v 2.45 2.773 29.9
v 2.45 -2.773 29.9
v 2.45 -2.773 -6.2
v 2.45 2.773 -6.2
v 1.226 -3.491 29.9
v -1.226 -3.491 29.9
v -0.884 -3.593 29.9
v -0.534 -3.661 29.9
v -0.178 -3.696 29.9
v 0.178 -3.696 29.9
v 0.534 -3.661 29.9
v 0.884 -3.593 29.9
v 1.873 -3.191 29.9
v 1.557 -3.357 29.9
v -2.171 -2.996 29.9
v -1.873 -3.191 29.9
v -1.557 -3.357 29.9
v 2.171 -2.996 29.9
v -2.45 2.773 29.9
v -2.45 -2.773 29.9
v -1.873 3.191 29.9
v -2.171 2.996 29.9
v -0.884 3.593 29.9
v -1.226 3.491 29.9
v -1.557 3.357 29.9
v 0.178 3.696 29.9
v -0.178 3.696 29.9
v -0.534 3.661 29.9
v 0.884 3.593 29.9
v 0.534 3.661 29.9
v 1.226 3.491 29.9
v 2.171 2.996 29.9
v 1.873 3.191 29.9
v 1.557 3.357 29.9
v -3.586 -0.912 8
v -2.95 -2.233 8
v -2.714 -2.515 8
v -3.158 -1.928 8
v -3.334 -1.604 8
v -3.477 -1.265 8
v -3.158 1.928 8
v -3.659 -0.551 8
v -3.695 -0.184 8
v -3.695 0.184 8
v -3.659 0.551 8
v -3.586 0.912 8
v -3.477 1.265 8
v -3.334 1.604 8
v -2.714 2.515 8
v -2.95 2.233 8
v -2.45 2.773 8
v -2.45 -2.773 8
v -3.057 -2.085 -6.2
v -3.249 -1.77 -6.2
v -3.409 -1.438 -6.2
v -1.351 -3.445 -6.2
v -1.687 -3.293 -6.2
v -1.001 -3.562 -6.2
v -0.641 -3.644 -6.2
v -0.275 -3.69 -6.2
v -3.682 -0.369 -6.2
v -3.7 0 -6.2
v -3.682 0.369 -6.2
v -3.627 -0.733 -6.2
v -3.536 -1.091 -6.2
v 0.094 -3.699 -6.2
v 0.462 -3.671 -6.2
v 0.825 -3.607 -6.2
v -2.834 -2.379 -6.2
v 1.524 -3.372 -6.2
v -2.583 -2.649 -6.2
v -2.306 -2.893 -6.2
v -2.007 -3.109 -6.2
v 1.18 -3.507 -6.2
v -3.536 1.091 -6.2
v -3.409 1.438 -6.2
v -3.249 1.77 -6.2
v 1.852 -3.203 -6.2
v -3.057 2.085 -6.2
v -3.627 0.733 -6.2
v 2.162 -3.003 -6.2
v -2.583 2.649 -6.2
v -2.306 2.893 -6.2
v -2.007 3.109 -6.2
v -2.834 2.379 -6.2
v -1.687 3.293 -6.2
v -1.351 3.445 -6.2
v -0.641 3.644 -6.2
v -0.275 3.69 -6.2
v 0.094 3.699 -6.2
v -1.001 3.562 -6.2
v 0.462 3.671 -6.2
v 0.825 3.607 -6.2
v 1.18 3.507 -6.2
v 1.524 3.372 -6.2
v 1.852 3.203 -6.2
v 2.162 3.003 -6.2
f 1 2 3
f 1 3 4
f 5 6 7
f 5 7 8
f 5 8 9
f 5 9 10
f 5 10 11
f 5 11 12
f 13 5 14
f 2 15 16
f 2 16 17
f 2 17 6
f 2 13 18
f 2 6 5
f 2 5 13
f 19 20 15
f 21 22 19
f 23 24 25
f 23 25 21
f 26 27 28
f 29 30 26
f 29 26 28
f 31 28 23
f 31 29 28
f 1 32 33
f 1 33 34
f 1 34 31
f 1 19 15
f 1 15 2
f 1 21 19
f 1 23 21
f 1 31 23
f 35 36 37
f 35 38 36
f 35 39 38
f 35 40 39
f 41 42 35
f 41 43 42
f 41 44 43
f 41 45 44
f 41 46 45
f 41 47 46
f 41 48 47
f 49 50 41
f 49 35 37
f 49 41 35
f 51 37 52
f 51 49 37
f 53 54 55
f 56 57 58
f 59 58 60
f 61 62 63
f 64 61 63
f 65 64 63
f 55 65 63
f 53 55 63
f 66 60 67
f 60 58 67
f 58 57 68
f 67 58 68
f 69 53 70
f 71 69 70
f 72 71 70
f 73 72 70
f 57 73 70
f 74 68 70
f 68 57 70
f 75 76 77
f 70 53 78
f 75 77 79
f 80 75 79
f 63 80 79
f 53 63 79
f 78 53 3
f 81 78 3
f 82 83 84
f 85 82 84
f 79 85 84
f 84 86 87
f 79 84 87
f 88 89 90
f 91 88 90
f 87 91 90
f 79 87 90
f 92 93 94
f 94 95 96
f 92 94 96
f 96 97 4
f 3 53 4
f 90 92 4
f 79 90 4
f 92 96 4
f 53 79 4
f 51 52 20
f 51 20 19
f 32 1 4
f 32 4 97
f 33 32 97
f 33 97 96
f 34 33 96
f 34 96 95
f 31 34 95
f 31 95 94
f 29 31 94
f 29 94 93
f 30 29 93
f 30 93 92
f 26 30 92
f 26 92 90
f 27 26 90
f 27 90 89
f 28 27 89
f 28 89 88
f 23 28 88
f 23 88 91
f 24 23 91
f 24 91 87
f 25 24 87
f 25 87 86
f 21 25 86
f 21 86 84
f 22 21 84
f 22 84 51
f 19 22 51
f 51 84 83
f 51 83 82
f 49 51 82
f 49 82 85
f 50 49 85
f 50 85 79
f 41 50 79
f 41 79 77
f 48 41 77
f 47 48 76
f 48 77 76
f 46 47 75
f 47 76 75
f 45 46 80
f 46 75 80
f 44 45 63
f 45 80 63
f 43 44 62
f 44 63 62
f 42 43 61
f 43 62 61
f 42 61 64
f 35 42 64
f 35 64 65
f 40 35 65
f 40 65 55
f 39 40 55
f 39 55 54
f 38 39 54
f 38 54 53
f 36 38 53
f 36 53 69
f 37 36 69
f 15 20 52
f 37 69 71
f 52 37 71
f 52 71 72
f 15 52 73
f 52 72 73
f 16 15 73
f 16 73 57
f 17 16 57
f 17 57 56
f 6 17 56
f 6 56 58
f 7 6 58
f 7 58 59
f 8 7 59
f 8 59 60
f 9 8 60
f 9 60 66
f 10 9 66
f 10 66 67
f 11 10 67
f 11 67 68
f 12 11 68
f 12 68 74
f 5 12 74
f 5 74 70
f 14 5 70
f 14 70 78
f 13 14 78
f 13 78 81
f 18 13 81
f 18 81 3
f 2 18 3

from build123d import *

# Parameters (mm, degrees)
BOX005_W          = 10
BOX005_H          = 10
BOX005_DEPTH      = 40
BOX004_W          = 10
BOX004_H          = 10
BOX004_DEPTH      = 40
CYLINDER011_R     = 3.7
CYLINDER011_DEPTH = 36.1


with BuildPart() as cube005:
    # Box005 → Box005 (new body)
    with BuildSketch(Plane(origin=(-1.85, -5, 5), x_dir=(1, 0, 0), z_dir=(0, 0, 1))):
        with Locations((5, 5)):
            Rectangle(BOX005_W, BOX005_H)
    extrude(amount=BOX005_DEPTH)


with BuildPart() as cube004:
    # Box004 → Box004 (new body)
    with BuildSketch(Plane(origin=(13.05, -5, -11), x_dir=(1, 0, 0), z_dir=(0, 0, 1))):
        with Locations((5, 5)):
            Rectangle(BOX004_W, BOX004_H)
    extrude(amount=BOX004_DEPTH)


with BuildPart() as drive:
    # Cylinder011 → Cylinder011 (new body)
    with BuildSketch(Plane(origin=(10.6, 0, -9.2), x_dir=(1, 0, 0), z_dir=(0, 0, 1))):
        Circle(CYLINDER011_R)
    extrude(amount=CYLINDER011_DEPTH)

    # Cut005: cut Cube004
    add(cube004.part, mode=Mode.SUBTRACT)

    # Cut006: cut Cube005
    add(cube005.part, mode=Mode.SUBTRACT)


with BuildPart() as drive_1:
    # Cut006 placement: moved
    add(drive.part.moved(Location((-10.6, 0, 3))))


solid = drive_1.part
